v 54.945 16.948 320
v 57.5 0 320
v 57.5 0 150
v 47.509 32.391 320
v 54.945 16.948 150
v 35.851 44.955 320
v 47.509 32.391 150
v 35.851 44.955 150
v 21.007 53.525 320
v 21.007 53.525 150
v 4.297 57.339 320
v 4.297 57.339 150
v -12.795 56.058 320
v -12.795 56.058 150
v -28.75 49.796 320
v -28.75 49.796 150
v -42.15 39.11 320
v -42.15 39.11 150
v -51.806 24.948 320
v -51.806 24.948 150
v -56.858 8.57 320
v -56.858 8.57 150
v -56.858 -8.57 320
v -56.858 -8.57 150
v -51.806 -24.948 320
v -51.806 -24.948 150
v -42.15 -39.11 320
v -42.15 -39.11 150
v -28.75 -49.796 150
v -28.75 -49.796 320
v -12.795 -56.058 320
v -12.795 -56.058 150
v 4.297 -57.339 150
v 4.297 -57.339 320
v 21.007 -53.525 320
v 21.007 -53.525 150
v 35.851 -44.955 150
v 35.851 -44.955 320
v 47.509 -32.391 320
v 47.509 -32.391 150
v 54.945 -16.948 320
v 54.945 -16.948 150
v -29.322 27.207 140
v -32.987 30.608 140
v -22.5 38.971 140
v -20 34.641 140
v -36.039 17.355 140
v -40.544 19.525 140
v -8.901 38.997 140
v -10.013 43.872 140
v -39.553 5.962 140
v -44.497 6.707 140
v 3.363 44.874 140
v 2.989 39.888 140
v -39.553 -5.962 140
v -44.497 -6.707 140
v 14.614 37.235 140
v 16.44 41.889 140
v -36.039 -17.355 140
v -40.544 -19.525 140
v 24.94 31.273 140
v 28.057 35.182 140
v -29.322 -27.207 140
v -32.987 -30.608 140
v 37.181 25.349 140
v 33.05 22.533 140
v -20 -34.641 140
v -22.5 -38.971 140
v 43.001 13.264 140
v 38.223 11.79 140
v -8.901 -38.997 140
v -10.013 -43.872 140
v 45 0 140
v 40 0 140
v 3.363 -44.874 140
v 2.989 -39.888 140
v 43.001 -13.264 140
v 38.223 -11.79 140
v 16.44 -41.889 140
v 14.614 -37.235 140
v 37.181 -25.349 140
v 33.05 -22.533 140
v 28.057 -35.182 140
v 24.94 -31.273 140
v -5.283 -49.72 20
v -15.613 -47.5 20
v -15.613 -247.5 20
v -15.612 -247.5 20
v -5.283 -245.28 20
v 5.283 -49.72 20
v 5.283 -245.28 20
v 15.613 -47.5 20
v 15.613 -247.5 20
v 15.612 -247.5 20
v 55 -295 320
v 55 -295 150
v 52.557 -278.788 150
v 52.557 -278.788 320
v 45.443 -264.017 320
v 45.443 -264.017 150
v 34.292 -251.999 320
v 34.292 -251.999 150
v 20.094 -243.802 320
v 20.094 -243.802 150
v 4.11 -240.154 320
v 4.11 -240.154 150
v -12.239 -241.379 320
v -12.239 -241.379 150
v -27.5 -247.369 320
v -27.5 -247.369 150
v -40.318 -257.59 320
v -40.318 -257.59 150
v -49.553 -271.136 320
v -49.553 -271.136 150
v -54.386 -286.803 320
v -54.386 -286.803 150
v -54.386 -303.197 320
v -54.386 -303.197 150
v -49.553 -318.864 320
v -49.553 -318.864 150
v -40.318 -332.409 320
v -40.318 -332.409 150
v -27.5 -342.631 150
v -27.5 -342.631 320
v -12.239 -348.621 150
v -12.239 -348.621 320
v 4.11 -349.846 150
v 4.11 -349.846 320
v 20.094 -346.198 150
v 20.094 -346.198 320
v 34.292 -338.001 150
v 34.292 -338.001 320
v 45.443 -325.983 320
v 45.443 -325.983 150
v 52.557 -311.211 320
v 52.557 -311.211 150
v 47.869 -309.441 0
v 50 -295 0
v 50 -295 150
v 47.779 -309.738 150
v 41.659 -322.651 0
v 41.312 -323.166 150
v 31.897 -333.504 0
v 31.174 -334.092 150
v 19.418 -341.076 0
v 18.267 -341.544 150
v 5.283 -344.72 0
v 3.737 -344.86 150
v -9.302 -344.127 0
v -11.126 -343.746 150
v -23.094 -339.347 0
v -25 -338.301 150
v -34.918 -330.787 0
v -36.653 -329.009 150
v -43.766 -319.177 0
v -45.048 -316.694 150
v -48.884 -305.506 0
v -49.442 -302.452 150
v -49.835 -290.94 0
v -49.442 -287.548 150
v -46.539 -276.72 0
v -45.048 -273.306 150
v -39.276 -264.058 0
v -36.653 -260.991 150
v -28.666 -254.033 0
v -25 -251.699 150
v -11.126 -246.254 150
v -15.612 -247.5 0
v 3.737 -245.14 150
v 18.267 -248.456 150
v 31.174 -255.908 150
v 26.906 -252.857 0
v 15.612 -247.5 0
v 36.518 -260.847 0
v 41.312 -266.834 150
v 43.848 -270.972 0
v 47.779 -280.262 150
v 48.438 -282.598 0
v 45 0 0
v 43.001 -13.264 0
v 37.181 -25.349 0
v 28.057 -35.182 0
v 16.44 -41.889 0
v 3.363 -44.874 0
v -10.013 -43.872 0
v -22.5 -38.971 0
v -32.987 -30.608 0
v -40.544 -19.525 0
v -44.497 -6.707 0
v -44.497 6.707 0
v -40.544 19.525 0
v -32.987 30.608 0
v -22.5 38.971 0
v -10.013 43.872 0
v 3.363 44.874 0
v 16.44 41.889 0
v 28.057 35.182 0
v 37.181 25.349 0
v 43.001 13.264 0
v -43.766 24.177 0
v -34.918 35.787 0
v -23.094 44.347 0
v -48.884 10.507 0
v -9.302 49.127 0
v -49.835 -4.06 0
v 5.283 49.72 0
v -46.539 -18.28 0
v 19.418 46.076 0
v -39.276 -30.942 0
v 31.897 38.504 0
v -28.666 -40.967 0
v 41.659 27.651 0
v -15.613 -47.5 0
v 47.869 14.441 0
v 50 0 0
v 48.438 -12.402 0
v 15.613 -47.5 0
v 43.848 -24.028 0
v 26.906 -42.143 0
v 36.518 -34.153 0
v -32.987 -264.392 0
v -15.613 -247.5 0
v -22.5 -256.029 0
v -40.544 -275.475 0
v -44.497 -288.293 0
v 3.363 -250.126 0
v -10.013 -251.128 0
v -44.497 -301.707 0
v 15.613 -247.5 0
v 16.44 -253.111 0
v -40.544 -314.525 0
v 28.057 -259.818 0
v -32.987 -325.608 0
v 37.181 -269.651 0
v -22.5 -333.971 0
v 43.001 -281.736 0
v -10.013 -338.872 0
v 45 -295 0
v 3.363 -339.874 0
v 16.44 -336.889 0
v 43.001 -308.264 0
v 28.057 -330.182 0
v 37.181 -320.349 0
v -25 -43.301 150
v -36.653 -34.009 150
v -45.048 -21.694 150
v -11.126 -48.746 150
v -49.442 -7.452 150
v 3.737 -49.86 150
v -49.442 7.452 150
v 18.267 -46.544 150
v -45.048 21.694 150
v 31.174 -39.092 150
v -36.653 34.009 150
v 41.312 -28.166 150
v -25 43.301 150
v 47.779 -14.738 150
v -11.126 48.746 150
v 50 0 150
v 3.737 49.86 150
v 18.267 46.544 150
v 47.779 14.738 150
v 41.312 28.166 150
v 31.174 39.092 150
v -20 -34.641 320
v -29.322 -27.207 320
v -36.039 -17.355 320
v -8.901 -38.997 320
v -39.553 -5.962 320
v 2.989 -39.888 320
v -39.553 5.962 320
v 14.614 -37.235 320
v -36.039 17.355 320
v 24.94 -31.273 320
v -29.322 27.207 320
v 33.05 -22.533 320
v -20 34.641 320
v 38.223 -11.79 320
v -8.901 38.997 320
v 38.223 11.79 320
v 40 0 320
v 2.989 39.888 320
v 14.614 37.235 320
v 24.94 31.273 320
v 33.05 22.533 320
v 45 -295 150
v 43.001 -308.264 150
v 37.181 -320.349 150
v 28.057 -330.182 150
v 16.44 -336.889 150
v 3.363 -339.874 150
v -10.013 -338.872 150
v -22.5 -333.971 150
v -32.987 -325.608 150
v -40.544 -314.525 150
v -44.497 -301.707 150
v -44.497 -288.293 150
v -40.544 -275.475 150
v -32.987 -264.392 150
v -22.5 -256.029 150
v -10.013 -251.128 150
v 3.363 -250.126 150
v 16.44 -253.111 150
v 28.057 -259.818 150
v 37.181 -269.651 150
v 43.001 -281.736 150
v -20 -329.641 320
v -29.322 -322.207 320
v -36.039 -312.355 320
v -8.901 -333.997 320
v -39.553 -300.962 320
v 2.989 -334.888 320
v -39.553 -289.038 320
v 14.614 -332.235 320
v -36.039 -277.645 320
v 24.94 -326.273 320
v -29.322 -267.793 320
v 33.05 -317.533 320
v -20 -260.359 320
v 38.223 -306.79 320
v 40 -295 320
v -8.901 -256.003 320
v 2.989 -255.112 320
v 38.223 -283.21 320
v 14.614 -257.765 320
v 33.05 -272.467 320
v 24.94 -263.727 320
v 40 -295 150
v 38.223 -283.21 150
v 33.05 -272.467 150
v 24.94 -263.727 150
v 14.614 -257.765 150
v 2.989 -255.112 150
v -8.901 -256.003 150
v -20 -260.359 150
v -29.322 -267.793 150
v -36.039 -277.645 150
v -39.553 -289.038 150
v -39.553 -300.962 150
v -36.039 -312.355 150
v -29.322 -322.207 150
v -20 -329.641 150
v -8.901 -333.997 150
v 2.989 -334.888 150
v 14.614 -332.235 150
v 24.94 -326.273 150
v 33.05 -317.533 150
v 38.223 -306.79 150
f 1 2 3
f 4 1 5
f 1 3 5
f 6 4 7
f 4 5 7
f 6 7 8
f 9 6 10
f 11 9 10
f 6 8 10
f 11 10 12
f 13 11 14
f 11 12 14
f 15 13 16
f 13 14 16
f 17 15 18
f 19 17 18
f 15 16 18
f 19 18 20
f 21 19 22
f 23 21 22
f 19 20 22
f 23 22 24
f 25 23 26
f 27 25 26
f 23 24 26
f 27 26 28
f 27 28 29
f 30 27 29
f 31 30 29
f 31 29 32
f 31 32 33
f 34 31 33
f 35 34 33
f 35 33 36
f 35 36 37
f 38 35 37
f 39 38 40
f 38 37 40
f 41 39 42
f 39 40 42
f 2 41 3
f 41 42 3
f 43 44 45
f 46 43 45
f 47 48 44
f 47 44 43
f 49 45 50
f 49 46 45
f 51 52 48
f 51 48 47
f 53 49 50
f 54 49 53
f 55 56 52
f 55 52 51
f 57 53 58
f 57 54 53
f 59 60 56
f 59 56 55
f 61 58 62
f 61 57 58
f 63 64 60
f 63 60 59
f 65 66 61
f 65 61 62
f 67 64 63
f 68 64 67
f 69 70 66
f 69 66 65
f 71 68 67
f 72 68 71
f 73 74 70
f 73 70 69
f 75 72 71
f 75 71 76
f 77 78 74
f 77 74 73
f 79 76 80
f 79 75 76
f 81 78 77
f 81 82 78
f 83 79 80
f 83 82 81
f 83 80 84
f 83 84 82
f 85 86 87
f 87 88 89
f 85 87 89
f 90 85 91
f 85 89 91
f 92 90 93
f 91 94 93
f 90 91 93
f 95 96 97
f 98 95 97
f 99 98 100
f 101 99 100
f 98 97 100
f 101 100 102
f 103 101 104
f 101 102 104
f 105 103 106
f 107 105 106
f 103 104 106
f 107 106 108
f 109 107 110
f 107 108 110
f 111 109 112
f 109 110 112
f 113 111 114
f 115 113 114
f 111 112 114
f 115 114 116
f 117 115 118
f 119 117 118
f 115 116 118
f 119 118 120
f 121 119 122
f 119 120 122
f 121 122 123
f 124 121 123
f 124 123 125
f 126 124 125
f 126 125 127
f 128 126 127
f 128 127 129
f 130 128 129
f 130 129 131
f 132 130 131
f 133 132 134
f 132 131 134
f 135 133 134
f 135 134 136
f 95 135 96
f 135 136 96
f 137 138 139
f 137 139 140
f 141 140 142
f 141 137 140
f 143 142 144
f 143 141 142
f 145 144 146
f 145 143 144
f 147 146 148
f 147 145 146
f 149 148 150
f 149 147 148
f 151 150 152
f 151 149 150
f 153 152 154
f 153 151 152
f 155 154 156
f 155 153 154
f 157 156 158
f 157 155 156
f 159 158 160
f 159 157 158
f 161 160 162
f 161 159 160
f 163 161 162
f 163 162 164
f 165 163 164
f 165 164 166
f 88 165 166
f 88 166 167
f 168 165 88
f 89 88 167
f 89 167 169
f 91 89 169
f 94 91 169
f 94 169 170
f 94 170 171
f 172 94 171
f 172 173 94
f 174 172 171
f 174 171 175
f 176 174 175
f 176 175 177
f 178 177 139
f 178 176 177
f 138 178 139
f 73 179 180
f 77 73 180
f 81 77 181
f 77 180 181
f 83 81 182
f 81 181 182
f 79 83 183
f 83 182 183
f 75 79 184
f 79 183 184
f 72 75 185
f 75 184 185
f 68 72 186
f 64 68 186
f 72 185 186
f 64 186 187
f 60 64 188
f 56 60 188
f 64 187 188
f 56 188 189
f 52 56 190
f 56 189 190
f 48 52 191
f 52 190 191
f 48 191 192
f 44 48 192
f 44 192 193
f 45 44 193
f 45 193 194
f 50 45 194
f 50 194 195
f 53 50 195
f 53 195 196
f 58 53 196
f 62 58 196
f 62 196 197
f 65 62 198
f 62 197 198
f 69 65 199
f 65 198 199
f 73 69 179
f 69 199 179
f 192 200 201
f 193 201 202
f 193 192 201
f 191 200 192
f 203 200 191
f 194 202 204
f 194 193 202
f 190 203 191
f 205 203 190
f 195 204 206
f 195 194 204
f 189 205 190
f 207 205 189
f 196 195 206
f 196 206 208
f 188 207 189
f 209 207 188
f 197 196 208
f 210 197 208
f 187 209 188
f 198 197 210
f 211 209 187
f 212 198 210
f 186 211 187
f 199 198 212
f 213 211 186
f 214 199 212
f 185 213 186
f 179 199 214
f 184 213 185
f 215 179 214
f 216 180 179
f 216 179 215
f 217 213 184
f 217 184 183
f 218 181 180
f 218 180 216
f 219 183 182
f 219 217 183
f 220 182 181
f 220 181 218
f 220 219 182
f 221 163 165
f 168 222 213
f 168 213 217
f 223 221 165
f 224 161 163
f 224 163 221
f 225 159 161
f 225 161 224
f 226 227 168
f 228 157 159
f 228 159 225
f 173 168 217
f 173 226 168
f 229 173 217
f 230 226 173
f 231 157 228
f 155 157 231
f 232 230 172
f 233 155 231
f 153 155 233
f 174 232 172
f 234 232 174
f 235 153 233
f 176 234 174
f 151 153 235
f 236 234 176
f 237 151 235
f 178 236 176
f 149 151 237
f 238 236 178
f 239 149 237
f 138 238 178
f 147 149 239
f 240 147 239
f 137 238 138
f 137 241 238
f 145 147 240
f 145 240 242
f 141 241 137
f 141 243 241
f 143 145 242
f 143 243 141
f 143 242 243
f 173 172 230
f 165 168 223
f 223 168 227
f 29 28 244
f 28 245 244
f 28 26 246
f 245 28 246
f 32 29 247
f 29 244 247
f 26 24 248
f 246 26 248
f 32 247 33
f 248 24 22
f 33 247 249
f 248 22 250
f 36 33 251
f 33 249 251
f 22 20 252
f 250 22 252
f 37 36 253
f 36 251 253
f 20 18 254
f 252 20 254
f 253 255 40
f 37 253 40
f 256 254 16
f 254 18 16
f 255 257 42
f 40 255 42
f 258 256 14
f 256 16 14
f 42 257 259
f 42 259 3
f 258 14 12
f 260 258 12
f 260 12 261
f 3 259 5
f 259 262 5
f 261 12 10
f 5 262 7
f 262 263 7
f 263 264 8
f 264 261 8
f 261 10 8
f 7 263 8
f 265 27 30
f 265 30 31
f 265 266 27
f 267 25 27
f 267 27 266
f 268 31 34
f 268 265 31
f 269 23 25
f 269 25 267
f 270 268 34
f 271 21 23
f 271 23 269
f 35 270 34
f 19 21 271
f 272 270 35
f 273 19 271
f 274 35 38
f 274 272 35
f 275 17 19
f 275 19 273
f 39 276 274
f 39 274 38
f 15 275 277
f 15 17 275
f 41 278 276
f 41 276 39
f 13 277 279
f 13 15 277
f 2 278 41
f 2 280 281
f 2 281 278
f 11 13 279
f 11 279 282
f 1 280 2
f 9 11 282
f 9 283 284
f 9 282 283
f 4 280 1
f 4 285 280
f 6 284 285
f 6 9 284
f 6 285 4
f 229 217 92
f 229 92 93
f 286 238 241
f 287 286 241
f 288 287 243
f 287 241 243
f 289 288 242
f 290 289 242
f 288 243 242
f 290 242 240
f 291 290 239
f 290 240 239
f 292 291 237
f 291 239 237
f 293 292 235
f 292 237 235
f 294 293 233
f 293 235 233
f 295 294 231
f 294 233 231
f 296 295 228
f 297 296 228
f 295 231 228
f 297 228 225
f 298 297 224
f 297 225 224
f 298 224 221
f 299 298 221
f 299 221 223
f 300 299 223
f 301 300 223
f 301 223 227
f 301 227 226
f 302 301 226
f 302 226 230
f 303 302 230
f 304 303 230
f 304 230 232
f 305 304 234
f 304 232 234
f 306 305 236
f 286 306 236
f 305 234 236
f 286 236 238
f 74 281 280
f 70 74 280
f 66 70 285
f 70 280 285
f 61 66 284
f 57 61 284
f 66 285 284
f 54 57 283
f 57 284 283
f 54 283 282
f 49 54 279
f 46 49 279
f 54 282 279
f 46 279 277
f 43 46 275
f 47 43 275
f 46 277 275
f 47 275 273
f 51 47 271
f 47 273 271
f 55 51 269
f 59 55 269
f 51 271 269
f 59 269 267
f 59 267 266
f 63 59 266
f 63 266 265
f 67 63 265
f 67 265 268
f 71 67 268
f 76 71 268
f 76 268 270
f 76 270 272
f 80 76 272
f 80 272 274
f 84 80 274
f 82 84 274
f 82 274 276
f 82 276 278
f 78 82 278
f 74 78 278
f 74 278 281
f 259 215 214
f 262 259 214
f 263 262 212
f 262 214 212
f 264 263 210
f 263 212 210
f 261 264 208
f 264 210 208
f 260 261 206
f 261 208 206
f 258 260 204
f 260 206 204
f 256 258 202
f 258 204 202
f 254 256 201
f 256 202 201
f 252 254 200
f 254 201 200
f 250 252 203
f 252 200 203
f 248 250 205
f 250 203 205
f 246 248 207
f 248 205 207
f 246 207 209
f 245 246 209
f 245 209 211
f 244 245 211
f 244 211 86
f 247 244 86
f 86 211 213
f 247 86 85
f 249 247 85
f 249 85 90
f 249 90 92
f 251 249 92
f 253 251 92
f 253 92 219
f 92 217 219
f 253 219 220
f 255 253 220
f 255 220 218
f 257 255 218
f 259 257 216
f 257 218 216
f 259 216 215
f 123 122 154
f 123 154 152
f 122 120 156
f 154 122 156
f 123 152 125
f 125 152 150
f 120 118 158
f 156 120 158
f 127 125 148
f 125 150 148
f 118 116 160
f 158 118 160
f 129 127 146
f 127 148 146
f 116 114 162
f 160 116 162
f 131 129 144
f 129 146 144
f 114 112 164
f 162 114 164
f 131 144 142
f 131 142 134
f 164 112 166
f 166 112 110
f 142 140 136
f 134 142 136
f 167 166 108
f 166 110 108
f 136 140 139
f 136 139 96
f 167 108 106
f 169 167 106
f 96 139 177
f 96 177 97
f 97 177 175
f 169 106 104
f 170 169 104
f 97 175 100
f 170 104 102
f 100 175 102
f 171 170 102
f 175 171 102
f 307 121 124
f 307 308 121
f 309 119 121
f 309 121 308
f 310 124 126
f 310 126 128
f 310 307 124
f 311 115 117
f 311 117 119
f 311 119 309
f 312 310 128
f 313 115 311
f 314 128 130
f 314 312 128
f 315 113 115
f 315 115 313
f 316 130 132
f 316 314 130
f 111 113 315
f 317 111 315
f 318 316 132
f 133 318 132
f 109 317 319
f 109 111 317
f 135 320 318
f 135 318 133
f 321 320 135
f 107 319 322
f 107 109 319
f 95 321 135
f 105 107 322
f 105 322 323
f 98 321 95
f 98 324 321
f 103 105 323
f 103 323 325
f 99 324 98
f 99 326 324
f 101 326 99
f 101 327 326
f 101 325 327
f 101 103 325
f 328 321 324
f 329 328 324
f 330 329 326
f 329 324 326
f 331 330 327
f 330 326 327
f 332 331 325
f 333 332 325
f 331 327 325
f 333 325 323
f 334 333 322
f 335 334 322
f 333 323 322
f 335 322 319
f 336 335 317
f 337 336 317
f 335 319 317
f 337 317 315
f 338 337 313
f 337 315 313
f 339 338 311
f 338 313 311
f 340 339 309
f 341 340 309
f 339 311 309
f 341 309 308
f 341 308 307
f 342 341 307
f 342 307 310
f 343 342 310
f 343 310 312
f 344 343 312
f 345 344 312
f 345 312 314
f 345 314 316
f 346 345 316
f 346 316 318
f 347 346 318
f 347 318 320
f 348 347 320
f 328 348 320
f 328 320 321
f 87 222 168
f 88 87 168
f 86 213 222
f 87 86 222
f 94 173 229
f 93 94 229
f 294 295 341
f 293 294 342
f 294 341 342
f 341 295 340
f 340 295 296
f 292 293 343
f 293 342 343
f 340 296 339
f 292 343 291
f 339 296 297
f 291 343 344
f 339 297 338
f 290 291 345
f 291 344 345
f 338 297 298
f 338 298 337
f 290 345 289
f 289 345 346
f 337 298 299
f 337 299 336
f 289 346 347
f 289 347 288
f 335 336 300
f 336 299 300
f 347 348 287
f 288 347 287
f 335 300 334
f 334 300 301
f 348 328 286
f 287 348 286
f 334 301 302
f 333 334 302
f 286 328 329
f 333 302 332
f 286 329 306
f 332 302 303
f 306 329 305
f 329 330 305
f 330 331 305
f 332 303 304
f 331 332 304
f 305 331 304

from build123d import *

# Parameters (mm, degrees)
F0_R      = 50
F1_DEPTH  = 150
F2_R      = 45
F3_DEPTH  = 140
F4_R      = 57.5
F5_DEPTH  = 170
F6_R      = 40
F7_DEPTH  = 383
F8_W      = 31.225212
F8_H      = 200
F9_DEPTH  = 20
F10_R     = 50
F11_DEPTH = 150
F12_R     = 45
F13_DEPTH = 150
F14_R     = 55
F15_DEPTH = 170
F16_R     = 40
F17_DEPTH = 5000


with BuildPart() as f1:
    # F0 (on Top) → F1 (new body)
    with BuildSketch(Plane.XY):
        Circle(F0_R)
    extrude(amount=F1_DEPTH)

    # F2 (on face) → F3 (cut)
    with BuildSketch(Plane(origin=(0, 0, 0), x_dir=(1, 0, 0), z_dir=(0, 0, -1))):
        Circle(F2_R)
    extrude(amount=-F3_DEPTH, mode=Mode.SUBTRACT)

    # F4 (on face) → F5 (join)
    with BuildSketch(Plane.XY.offset(150)):
        Circle(F4_R)
    extrude(amount=F5_DEPTH)

    # F6 (on face) → F7 (cut)
    with BuildSketch(Plane.XY.offset(320)):
        Circle(F6_R)
    extrude(amount=-F7_DEPTH, mode=Mode.SUBTRACT)

    # F8 (on face) → F9 (join)
    with BuildSketch(Plane(origin=(0, 0, 0), x_dir=(1, 0, 0), z_dir=(0, 0, -1))):
        with Locations((0, 147.499964)):
            Rectangle(F8_W, F8_H)
    extrude(amount=-F9_DEPTH)

    # F10 (on face) → F11 (join)
    with BuildSketch(Plane(origin=(0, 0, 0), x_dir=(1, 0, 0), z_dir=(0, 0, -1))):
        with Locations((0, 294.999964)):
            Circle(F10_R)
    extrude(amount=-F11_DEPTH)

    # F12 (on face) → F13 (cut)
    with BuildSketch(Plane(origin=(0, 0, 0), x_dir=(1, 0, 0), z_dir=(0, 0, -1))):
        with Locations((0, 294.999964)):
            Circle(F12_R)
    extrude(amount=-F13_DEPTH, mode=Mode.SUBTRACT)

    # F14 (on face) → F15 (join)
    with BuildSketch(Plane.XY.offset(150)):
        with Locations((0, -294.999964)):
            Circle(F14_R)
    extrude(amount=F15_DEPTH)

    # F16 (on face) → F17 (cut)
    with BuildSketch(Plane.XY.offset(320)):
        with Locations((0, -294.999964)):
            Circle(F16_R)
    extrude(amount=-F17_DEPTH, mode=Mode.SUBTRACT)


solid = f1.part
